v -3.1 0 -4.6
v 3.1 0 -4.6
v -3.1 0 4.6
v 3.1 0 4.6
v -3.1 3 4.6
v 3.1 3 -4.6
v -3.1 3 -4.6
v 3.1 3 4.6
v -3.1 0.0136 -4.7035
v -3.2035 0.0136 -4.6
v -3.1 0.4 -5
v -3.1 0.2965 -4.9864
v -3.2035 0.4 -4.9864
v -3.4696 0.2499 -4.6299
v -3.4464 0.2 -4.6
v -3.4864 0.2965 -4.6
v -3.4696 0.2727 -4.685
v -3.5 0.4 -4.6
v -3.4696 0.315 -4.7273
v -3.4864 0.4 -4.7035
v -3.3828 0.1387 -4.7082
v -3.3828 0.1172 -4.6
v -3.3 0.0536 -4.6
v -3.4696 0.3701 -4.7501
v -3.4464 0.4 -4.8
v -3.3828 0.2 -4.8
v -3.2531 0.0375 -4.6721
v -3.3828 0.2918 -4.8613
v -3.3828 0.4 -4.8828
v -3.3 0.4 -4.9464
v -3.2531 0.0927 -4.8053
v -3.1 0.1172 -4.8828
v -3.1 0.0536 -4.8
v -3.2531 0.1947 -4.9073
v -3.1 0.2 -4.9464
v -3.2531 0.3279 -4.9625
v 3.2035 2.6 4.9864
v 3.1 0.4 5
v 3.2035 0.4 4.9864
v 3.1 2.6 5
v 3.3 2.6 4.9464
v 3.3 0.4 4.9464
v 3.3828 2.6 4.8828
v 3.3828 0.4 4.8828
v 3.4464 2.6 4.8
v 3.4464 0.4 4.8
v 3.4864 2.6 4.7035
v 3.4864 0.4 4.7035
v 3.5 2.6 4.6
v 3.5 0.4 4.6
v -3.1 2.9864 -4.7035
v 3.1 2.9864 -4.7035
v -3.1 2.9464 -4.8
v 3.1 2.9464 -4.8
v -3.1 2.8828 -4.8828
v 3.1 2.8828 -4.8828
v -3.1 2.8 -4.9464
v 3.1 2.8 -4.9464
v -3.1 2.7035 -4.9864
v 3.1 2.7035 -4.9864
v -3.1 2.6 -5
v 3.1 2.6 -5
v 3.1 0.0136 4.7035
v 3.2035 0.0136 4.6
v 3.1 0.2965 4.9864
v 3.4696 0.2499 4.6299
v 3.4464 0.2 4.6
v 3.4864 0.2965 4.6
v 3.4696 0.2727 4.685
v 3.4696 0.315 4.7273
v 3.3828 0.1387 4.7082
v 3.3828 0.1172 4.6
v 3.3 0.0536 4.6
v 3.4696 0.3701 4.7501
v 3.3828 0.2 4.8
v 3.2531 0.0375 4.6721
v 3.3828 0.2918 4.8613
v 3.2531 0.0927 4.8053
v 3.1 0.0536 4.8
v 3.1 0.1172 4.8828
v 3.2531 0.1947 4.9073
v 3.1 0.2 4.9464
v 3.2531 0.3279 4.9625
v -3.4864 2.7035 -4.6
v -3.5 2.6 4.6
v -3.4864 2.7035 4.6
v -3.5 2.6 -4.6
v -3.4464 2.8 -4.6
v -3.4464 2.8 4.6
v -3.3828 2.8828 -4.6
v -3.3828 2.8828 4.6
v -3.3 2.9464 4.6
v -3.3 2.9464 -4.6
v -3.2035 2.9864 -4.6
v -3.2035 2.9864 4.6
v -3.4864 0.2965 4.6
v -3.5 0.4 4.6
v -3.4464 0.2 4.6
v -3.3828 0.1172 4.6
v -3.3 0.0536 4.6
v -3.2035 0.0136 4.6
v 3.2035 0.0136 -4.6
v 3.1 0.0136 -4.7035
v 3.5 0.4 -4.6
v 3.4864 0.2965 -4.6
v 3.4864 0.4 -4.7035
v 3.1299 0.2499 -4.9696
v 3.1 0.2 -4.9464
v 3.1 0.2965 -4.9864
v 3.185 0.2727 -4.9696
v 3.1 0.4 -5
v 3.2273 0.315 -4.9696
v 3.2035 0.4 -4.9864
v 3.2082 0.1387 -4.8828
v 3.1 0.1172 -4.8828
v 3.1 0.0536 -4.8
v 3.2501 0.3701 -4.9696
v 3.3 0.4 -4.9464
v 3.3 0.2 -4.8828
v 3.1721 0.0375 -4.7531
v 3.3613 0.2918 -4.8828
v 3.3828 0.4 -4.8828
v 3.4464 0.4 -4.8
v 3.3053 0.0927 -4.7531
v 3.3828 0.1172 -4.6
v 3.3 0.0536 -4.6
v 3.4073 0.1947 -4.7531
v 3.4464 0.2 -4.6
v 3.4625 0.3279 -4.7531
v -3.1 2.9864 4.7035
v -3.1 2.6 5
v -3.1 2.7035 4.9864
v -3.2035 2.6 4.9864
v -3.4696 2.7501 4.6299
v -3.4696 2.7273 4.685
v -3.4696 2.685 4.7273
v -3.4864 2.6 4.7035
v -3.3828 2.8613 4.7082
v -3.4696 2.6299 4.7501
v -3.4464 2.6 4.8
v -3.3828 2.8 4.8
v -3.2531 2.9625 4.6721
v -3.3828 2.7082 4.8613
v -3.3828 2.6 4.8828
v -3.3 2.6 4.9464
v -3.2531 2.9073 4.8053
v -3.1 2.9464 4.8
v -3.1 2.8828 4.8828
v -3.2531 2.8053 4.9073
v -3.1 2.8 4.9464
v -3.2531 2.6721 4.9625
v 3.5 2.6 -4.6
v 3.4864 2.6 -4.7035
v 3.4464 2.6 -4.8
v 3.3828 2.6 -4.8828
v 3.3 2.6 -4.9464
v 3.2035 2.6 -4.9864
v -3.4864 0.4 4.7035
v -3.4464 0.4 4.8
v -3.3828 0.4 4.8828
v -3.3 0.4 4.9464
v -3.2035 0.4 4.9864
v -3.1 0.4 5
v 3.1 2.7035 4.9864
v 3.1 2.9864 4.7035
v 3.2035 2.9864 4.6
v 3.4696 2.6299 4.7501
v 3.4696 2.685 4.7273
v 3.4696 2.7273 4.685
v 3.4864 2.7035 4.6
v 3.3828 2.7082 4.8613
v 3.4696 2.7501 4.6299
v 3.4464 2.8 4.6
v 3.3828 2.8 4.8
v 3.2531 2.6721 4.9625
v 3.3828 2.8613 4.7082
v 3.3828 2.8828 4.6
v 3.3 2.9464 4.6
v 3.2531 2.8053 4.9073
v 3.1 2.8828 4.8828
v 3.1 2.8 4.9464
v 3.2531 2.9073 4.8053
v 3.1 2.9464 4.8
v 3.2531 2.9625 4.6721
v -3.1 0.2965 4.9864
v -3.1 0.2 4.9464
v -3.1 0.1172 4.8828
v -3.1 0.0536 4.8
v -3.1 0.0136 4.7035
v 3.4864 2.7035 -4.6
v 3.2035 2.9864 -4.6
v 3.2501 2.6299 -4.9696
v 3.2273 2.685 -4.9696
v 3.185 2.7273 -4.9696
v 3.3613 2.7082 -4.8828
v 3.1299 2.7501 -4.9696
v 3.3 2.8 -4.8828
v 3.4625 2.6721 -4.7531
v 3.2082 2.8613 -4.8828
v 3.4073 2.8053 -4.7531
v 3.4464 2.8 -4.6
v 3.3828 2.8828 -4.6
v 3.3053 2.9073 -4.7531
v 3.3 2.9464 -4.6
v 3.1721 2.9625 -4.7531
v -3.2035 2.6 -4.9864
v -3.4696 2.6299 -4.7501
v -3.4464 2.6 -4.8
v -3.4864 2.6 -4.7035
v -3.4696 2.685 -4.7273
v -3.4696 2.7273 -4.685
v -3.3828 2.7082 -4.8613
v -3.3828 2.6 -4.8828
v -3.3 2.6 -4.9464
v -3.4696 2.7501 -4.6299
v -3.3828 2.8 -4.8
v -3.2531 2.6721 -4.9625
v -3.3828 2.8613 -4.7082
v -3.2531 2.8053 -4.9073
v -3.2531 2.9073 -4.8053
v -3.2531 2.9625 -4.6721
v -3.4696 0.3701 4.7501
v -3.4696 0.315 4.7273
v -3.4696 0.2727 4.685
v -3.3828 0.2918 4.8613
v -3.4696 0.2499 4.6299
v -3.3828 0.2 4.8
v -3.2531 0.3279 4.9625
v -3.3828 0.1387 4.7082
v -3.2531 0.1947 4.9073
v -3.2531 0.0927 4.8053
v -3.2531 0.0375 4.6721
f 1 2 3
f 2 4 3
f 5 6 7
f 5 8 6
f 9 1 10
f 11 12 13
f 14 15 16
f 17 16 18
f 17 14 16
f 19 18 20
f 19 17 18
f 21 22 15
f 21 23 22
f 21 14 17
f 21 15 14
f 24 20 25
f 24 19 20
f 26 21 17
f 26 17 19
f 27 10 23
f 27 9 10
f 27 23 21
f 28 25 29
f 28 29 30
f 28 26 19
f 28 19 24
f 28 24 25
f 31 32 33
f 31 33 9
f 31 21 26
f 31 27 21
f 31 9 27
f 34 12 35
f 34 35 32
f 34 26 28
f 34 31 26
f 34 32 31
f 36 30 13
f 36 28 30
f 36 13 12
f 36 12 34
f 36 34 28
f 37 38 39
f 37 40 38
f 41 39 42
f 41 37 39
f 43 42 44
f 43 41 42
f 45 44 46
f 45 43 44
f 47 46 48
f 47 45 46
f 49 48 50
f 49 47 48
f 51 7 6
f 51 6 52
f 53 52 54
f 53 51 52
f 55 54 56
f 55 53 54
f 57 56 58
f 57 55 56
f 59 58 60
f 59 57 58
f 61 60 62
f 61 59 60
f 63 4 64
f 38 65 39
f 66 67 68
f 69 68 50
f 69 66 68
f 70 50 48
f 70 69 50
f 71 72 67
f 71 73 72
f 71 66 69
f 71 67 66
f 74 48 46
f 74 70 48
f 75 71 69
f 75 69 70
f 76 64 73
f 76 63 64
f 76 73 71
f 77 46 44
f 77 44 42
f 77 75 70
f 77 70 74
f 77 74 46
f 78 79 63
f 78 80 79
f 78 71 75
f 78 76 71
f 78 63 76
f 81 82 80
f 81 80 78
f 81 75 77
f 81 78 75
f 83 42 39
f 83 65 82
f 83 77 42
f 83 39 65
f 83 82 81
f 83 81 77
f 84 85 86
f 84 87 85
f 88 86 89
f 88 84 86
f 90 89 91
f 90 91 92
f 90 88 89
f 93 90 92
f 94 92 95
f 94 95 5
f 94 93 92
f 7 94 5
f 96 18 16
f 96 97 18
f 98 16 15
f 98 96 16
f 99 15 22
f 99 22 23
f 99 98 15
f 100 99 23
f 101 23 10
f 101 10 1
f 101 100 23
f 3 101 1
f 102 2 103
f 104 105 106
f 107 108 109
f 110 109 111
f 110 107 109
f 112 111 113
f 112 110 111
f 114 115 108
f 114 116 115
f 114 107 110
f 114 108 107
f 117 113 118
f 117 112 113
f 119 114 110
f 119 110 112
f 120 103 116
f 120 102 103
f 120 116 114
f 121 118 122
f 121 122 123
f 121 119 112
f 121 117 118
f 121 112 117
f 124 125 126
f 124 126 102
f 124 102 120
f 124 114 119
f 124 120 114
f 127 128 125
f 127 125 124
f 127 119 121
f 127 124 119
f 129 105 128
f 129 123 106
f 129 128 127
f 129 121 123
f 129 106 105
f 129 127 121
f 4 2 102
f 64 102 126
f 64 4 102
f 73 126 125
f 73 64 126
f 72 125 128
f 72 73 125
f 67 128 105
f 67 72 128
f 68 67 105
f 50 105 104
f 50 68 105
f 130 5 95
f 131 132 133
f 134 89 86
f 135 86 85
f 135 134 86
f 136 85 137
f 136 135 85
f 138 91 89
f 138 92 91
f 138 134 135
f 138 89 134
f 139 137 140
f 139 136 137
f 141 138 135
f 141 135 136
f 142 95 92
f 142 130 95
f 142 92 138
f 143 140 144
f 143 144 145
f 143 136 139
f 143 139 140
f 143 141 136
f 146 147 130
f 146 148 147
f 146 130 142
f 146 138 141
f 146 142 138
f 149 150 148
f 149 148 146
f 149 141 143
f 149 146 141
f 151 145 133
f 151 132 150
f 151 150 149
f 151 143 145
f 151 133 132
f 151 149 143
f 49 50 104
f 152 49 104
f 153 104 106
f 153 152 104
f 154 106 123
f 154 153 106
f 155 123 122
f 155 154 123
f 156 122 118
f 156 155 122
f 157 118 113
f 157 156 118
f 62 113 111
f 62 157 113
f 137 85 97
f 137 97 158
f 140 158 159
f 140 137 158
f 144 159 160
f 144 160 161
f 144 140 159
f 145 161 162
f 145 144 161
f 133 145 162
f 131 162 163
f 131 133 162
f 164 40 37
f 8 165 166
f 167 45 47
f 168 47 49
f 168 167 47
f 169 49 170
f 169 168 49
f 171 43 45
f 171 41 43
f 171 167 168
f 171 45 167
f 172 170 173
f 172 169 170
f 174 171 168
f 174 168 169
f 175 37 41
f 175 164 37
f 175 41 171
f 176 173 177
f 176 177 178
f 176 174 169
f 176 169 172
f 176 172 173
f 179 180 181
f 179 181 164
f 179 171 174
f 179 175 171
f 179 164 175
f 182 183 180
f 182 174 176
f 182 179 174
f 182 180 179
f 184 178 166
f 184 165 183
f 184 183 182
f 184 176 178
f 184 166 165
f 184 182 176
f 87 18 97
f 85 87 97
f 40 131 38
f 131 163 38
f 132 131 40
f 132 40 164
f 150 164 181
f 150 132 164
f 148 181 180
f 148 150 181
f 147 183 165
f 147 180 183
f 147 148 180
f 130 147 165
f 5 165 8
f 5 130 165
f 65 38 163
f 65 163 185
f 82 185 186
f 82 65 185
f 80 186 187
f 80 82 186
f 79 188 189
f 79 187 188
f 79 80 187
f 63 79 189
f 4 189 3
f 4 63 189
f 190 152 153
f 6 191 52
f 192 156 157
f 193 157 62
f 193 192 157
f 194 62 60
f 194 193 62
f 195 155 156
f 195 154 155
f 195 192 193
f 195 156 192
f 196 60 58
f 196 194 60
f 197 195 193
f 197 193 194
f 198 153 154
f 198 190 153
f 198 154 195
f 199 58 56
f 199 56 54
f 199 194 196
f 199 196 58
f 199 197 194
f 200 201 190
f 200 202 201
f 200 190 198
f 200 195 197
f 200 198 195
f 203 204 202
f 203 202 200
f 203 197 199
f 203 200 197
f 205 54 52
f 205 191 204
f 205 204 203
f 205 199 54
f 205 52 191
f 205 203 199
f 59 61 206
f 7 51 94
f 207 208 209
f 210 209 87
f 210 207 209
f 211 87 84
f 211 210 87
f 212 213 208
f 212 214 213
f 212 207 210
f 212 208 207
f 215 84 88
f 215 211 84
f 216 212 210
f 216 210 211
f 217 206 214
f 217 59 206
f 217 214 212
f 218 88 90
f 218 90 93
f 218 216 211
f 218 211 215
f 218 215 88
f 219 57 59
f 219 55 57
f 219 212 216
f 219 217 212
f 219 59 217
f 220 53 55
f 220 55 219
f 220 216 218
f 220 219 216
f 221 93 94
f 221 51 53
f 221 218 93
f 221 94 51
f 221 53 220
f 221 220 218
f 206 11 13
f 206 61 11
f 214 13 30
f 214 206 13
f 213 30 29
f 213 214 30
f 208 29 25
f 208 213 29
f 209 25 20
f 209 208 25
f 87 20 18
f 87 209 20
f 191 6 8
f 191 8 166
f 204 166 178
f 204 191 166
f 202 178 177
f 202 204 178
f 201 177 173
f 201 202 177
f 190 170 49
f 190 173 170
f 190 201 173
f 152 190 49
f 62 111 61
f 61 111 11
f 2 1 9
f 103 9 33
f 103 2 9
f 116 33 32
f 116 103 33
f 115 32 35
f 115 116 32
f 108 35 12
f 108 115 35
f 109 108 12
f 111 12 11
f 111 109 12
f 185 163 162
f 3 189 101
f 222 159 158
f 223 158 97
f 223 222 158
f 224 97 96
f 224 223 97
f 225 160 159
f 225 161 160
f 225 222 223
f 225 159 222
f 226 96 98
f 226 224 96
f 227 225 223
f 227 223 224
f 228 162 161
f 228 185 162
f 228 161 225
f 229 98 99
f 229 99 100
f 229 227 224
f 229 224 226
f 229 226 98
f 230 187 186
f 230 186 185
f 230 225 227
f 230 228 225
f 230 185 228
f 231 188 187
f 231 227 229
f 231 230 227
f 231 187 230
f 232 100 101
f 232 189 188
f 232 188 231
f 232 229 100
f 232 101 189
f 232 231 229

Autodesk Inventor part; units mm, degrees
ref_plane "YZ Plane" through (0, 0, 0) normal (1, 0, 0) x (0, 1, 0)
ref_plane "XZ Plane" through (0, 0, 0) normal (0, 1, 0) x (-1, 0, 0)
ref_plane "XY Plane" through (0, 0, 0) normal (0, 0, 1) x (1, 0, 0)
sketch "Szkic1" plane through (0, 0, 0) normal (0, 1, 0) x (-1, 0, 0)
  line L0 (3.5, 5) -> (-3.5, 5)
  line L1 (-3.5, 5) -> (-3.5, -5)
  line L2 (-3.5, -5) -> (3.5, -5)
  line L3 (3.5, -5) -> (3.5, 5)
  line L4 (4.9, 0) -> (-4.9, 0) projected
  line L5 (0, -7) -> (0, 7) projected
  point P0 (0, 0)
  point P1 (3.5, 0)
  point P2 (0, 5)
  dimension "d0" = 7
  dimension "d1" = 10
extrude "Wyciągnięcie proste1" add sketch "Szkic1" along normal blind 3
fillet "Zaokrąglenie1" radius 0.4 12 edges at (0, 3, 5) (3.5, 3, 0) (0, 0, 5) (3.5, 0, 0) (3.5, 1.5, 5) (3.5, 1.5, -5) (0, 3, -5) (0, 0, -5) (-3.5, 1.5, -5) (-3.5, 3, 0) (-3.5, 0, 0) (-3.5, 1.5, 5)
equation "\"d0\" = mag_size_x"
equation "\"d1\" = mag_size_z"
equation "\"d2\" = mag_size_y"
equation "\"d4\" = mag_corner_r"
equation "\"stator_r_out\" = 30.15"
equation "\"stator_out_d\" = 3.2"
equation "\"stator_h\" = 45"
equation "\"mag_size_x\" = 7"
equation "\"mag_size_y\" = 3"
equation "\"mag_size_z\" = 10"
equation "\"mag_corner_r\" = 0.4"
equation "\"magnet_ring_d\" = 3.3"
equation "\"magnet_ring_r\" = 26.95"
equation "\"magnet_ring_pocket_mag_size_y\" = 3.1"
equation "\"magnet_ring_pocket_mag_size_x\" = 7.1"
equation "\"magnet_ring_pocket_mag_size_z\" = 10.1"
equation "\"magnet_ring_mag_count\" = 16"
equation "\"magnet_ring_h\" = 36"
equation "\"magnet_ring_pocket_radial_cut\" = 1.4"
equation "\"casing_d\" = 3"
equation "\"casing_r_in\" = 30.15"
equation "\"rotor_core_r\" = 14.97"
equation "\"coil_groove_ang\" = 18"
equation "\"rotor_out_r\" = 22.5"
equation "\"rotor_coil_groove_in_r\" = 17"
equation "\"rotor_coil_groove_ang\" = 18deg"
equation "\"rotor_coil_groove_in_correction_r\" = 18"
equation "\"rotor_plastic_h\" = 32"
equation "\"rotor_teeth_d\" = 1.5"
equation "\"shaft_d\" = 8"
equation "\"insert25m_d\" = 2.9"
equation "\"insert25m_corner\" = 0.5"
equation "\"insert25m_h\" = 7"
equation "\"rotor_plastic_insert_r\" = 37"
equation "\"shaft_lock_1_d\" = 8.1"
equation "\"shaf_lock_1_D\" = 32"
equation "\"shaft_lock_1_D\" = 44"
equation "\"shaft_lock_1_h1\" = 3.5"
equation "\"shaft_lock_1_insert_part_h\" = 8"
equation "\"shaft_lock_1_corner\" = 2"
equation "\"shaft_lock_1_insert_part_a\" = 18"
equation "\"shaft_lock_2_h1\" = 3.5"
equation "\"shaft_lock_2_d\" = 8.1"
equation "\"shaft_lock_2_insert_part_a\" = 18"
equation "\"shaft_lock_2_D\" = 44"
equation "\"shaft_lock_2_corner\" = 2"
equation "\"shaft_lock_2_insert_part_h\" = 7"
equation "\"shaft_lock_2_rotor_insert_grove_d_in\" = 36"
equation "\"shaft_lock_2_rotor_insert_grove_width_out\" = 5.5"
equation "\"shaft_lock_2_rotor_insert_grove_width_in\" = 7.6"
equation "\"shaft_lock_2_rotor_insert_r\" = 37"
equation "\"shaft_lock_2_rotor_insert_screw_d\" = 2.6"
equation "\"insert25m_pocket_d\" = 2.6"
equation "\"insert25m_pocket_D\" = 4.5"
equation "\"insert25m_pocket_nut_h\" = 1.5"
equation "\"insert_m2_pocket_d\" = 2.6"
equation "\"insert_m2_h\" = 7"
equation "\"insert_m2_d\" = 2.9"
equation "\"insert_m2_corner\" = 0.5"
equation "\"insert_m2_pocket_D\" = 4.5"
equation "\"insert_m2_pocket_nut_h\" = 1.5"
equation "\"shaft_lock_1_insert_part_corner\" = 6"
equation "\"shaft_lock_1_insert_part_pos\" = 4"
equation "\"shaft_lock_1_rotor_insert_grove_width_in\" = 7.6"
equation "\"shaft_lock_1_rotor_insert_r\" = 37"
equation "\"shaft_lock_1_rotor_insert_grove_d_in\" = 36"
equation "\"shaft_lock_1_rotor_insert_grove_width_out\" = 5.5"
equation "\"shaft_lock_1_shaft_insert_axial_cut_out_width\" = 12"
equation "\"shaft_lock_1_shaft_insert_axial_cut_in_width\" = 5.4"
equation "\"shaft_lock_1_shaft_insert_corner\" = 2"
equation "\"shaft_lock_1_shaft_insert_corner_finish\" = 0.5"
equation "\"shaft_lock_1_shaft_insert_pos\" = 2.5"
equation "\"shaft_lock_2_shaft_insert_corner\" = 2"
equation "\"shaft_lock_2_shaft_insert_pos\" = 2.5"
equation "\"shaft_lock_2_shaft_insert_axial_cut_in_width\" = 5.4"
equation "\"shaft_lock_2_shaft_insert_axial_cut_out_width\" = 12"
equation "\"shaft_lock_2_shaft_insert_corner_finish\" = 0.5"
equation "\"commutator_plate_D\" = 22"
equation "\"commutator_plastic_d\" = 1"
equation "\"commutator_plastic_h\" = 17"
equation "\"commutator_plate_ang\" = 55deg"
equation "\"commutator_plate_d\" = 1"
equation "\"commutator_plate_h\" = 17"
equation "\"commutator_plastic_shaft_d\" = 8.1"
equation "\"commutator_plastic_insert_cut_deepness\" = 0.5"
equation "\"commutator_plastic_insert_cut_length\" = 6"
equation "\"commutator_plastic_insert_pos\" = 3"
equation "\"commutator_plate_insert_pos\" = 3"
equation "\"casing_lock_hole_r\" = 14.25"
equation "\"casing_lock_h\" = 8"
equation "\"casing_stator_fix_r\" = 23"
equation "\"casing_stator_fix_h\" = 6"
equation "\"magnet_ring_insert_part_lengthen\" = 8"
equation "\"casing_sidebar_length\" = 3"
equation "\"casing_vent_hole_length\" = 4"
equation "\"casing_vent_hole_width\" = 6"
equation "\"sleeve_cup_r\" = 22"
equation "\"sleeve_cup_h\" = 4.5"
equation "\"sleeve_h\" = 7"
equation "\"sleeve_d\" = 3"
equation "\"sleeve_in_r\" = 11.1"
equation "\"casing_head_insert_r\" = 19"
equation "\"sleeve_head_insert_r\" = 19"
equation "\"magnet_ring_insert_part_radius_cut\" = 0.17"
equation "\"magnet_ring_insert_part_axial_flat_cut\" = 0.17"
equation "\"magnet_ring_insert_pos\" = 4"
equation "\"casing_radial_stator_insert_pos\" = 18.1"
equation "\"stator_radial_screw_d\" = 4"
equation "\"stator_radial_screw_pos\" = 4"
equation "\"rotor_sleeve_out_D\" = 10.5"
equation "\"rotor_sleeve_in_D\" = 8.15"
equation "\"rotor_sleeve_h\" = 32"
equation "\"carbon_brush_batt_h\" = 8"
equation "\"carbon_brush_batt_d\" = 4"
equation "\"brush_cart_outer_holder_width\" = 5.5"
equation "\"brush_cart_outer_holder_arc_r\" = 33.15"
equation "\"brush_cart_outer_holder_arc_pos\" = 1.5"
equation "\"casing_cart_hole_corner\" = 1"
equation "\"casing_cart_hole_width\" = 2.6"
equation "\"casing_cart_hole_ang\" = 90deg"
equation "\"brush_holder_batt_arc_r\" = 30.15"
equation "\"brush_holder_batt_width\" = 16"
equation "\"brush_holder_batt_insert_flat_depth\" = 6"
equation "\"brush_holder_batt_insert_flat_length\" = 6"
properties part number "stator_magnet"
